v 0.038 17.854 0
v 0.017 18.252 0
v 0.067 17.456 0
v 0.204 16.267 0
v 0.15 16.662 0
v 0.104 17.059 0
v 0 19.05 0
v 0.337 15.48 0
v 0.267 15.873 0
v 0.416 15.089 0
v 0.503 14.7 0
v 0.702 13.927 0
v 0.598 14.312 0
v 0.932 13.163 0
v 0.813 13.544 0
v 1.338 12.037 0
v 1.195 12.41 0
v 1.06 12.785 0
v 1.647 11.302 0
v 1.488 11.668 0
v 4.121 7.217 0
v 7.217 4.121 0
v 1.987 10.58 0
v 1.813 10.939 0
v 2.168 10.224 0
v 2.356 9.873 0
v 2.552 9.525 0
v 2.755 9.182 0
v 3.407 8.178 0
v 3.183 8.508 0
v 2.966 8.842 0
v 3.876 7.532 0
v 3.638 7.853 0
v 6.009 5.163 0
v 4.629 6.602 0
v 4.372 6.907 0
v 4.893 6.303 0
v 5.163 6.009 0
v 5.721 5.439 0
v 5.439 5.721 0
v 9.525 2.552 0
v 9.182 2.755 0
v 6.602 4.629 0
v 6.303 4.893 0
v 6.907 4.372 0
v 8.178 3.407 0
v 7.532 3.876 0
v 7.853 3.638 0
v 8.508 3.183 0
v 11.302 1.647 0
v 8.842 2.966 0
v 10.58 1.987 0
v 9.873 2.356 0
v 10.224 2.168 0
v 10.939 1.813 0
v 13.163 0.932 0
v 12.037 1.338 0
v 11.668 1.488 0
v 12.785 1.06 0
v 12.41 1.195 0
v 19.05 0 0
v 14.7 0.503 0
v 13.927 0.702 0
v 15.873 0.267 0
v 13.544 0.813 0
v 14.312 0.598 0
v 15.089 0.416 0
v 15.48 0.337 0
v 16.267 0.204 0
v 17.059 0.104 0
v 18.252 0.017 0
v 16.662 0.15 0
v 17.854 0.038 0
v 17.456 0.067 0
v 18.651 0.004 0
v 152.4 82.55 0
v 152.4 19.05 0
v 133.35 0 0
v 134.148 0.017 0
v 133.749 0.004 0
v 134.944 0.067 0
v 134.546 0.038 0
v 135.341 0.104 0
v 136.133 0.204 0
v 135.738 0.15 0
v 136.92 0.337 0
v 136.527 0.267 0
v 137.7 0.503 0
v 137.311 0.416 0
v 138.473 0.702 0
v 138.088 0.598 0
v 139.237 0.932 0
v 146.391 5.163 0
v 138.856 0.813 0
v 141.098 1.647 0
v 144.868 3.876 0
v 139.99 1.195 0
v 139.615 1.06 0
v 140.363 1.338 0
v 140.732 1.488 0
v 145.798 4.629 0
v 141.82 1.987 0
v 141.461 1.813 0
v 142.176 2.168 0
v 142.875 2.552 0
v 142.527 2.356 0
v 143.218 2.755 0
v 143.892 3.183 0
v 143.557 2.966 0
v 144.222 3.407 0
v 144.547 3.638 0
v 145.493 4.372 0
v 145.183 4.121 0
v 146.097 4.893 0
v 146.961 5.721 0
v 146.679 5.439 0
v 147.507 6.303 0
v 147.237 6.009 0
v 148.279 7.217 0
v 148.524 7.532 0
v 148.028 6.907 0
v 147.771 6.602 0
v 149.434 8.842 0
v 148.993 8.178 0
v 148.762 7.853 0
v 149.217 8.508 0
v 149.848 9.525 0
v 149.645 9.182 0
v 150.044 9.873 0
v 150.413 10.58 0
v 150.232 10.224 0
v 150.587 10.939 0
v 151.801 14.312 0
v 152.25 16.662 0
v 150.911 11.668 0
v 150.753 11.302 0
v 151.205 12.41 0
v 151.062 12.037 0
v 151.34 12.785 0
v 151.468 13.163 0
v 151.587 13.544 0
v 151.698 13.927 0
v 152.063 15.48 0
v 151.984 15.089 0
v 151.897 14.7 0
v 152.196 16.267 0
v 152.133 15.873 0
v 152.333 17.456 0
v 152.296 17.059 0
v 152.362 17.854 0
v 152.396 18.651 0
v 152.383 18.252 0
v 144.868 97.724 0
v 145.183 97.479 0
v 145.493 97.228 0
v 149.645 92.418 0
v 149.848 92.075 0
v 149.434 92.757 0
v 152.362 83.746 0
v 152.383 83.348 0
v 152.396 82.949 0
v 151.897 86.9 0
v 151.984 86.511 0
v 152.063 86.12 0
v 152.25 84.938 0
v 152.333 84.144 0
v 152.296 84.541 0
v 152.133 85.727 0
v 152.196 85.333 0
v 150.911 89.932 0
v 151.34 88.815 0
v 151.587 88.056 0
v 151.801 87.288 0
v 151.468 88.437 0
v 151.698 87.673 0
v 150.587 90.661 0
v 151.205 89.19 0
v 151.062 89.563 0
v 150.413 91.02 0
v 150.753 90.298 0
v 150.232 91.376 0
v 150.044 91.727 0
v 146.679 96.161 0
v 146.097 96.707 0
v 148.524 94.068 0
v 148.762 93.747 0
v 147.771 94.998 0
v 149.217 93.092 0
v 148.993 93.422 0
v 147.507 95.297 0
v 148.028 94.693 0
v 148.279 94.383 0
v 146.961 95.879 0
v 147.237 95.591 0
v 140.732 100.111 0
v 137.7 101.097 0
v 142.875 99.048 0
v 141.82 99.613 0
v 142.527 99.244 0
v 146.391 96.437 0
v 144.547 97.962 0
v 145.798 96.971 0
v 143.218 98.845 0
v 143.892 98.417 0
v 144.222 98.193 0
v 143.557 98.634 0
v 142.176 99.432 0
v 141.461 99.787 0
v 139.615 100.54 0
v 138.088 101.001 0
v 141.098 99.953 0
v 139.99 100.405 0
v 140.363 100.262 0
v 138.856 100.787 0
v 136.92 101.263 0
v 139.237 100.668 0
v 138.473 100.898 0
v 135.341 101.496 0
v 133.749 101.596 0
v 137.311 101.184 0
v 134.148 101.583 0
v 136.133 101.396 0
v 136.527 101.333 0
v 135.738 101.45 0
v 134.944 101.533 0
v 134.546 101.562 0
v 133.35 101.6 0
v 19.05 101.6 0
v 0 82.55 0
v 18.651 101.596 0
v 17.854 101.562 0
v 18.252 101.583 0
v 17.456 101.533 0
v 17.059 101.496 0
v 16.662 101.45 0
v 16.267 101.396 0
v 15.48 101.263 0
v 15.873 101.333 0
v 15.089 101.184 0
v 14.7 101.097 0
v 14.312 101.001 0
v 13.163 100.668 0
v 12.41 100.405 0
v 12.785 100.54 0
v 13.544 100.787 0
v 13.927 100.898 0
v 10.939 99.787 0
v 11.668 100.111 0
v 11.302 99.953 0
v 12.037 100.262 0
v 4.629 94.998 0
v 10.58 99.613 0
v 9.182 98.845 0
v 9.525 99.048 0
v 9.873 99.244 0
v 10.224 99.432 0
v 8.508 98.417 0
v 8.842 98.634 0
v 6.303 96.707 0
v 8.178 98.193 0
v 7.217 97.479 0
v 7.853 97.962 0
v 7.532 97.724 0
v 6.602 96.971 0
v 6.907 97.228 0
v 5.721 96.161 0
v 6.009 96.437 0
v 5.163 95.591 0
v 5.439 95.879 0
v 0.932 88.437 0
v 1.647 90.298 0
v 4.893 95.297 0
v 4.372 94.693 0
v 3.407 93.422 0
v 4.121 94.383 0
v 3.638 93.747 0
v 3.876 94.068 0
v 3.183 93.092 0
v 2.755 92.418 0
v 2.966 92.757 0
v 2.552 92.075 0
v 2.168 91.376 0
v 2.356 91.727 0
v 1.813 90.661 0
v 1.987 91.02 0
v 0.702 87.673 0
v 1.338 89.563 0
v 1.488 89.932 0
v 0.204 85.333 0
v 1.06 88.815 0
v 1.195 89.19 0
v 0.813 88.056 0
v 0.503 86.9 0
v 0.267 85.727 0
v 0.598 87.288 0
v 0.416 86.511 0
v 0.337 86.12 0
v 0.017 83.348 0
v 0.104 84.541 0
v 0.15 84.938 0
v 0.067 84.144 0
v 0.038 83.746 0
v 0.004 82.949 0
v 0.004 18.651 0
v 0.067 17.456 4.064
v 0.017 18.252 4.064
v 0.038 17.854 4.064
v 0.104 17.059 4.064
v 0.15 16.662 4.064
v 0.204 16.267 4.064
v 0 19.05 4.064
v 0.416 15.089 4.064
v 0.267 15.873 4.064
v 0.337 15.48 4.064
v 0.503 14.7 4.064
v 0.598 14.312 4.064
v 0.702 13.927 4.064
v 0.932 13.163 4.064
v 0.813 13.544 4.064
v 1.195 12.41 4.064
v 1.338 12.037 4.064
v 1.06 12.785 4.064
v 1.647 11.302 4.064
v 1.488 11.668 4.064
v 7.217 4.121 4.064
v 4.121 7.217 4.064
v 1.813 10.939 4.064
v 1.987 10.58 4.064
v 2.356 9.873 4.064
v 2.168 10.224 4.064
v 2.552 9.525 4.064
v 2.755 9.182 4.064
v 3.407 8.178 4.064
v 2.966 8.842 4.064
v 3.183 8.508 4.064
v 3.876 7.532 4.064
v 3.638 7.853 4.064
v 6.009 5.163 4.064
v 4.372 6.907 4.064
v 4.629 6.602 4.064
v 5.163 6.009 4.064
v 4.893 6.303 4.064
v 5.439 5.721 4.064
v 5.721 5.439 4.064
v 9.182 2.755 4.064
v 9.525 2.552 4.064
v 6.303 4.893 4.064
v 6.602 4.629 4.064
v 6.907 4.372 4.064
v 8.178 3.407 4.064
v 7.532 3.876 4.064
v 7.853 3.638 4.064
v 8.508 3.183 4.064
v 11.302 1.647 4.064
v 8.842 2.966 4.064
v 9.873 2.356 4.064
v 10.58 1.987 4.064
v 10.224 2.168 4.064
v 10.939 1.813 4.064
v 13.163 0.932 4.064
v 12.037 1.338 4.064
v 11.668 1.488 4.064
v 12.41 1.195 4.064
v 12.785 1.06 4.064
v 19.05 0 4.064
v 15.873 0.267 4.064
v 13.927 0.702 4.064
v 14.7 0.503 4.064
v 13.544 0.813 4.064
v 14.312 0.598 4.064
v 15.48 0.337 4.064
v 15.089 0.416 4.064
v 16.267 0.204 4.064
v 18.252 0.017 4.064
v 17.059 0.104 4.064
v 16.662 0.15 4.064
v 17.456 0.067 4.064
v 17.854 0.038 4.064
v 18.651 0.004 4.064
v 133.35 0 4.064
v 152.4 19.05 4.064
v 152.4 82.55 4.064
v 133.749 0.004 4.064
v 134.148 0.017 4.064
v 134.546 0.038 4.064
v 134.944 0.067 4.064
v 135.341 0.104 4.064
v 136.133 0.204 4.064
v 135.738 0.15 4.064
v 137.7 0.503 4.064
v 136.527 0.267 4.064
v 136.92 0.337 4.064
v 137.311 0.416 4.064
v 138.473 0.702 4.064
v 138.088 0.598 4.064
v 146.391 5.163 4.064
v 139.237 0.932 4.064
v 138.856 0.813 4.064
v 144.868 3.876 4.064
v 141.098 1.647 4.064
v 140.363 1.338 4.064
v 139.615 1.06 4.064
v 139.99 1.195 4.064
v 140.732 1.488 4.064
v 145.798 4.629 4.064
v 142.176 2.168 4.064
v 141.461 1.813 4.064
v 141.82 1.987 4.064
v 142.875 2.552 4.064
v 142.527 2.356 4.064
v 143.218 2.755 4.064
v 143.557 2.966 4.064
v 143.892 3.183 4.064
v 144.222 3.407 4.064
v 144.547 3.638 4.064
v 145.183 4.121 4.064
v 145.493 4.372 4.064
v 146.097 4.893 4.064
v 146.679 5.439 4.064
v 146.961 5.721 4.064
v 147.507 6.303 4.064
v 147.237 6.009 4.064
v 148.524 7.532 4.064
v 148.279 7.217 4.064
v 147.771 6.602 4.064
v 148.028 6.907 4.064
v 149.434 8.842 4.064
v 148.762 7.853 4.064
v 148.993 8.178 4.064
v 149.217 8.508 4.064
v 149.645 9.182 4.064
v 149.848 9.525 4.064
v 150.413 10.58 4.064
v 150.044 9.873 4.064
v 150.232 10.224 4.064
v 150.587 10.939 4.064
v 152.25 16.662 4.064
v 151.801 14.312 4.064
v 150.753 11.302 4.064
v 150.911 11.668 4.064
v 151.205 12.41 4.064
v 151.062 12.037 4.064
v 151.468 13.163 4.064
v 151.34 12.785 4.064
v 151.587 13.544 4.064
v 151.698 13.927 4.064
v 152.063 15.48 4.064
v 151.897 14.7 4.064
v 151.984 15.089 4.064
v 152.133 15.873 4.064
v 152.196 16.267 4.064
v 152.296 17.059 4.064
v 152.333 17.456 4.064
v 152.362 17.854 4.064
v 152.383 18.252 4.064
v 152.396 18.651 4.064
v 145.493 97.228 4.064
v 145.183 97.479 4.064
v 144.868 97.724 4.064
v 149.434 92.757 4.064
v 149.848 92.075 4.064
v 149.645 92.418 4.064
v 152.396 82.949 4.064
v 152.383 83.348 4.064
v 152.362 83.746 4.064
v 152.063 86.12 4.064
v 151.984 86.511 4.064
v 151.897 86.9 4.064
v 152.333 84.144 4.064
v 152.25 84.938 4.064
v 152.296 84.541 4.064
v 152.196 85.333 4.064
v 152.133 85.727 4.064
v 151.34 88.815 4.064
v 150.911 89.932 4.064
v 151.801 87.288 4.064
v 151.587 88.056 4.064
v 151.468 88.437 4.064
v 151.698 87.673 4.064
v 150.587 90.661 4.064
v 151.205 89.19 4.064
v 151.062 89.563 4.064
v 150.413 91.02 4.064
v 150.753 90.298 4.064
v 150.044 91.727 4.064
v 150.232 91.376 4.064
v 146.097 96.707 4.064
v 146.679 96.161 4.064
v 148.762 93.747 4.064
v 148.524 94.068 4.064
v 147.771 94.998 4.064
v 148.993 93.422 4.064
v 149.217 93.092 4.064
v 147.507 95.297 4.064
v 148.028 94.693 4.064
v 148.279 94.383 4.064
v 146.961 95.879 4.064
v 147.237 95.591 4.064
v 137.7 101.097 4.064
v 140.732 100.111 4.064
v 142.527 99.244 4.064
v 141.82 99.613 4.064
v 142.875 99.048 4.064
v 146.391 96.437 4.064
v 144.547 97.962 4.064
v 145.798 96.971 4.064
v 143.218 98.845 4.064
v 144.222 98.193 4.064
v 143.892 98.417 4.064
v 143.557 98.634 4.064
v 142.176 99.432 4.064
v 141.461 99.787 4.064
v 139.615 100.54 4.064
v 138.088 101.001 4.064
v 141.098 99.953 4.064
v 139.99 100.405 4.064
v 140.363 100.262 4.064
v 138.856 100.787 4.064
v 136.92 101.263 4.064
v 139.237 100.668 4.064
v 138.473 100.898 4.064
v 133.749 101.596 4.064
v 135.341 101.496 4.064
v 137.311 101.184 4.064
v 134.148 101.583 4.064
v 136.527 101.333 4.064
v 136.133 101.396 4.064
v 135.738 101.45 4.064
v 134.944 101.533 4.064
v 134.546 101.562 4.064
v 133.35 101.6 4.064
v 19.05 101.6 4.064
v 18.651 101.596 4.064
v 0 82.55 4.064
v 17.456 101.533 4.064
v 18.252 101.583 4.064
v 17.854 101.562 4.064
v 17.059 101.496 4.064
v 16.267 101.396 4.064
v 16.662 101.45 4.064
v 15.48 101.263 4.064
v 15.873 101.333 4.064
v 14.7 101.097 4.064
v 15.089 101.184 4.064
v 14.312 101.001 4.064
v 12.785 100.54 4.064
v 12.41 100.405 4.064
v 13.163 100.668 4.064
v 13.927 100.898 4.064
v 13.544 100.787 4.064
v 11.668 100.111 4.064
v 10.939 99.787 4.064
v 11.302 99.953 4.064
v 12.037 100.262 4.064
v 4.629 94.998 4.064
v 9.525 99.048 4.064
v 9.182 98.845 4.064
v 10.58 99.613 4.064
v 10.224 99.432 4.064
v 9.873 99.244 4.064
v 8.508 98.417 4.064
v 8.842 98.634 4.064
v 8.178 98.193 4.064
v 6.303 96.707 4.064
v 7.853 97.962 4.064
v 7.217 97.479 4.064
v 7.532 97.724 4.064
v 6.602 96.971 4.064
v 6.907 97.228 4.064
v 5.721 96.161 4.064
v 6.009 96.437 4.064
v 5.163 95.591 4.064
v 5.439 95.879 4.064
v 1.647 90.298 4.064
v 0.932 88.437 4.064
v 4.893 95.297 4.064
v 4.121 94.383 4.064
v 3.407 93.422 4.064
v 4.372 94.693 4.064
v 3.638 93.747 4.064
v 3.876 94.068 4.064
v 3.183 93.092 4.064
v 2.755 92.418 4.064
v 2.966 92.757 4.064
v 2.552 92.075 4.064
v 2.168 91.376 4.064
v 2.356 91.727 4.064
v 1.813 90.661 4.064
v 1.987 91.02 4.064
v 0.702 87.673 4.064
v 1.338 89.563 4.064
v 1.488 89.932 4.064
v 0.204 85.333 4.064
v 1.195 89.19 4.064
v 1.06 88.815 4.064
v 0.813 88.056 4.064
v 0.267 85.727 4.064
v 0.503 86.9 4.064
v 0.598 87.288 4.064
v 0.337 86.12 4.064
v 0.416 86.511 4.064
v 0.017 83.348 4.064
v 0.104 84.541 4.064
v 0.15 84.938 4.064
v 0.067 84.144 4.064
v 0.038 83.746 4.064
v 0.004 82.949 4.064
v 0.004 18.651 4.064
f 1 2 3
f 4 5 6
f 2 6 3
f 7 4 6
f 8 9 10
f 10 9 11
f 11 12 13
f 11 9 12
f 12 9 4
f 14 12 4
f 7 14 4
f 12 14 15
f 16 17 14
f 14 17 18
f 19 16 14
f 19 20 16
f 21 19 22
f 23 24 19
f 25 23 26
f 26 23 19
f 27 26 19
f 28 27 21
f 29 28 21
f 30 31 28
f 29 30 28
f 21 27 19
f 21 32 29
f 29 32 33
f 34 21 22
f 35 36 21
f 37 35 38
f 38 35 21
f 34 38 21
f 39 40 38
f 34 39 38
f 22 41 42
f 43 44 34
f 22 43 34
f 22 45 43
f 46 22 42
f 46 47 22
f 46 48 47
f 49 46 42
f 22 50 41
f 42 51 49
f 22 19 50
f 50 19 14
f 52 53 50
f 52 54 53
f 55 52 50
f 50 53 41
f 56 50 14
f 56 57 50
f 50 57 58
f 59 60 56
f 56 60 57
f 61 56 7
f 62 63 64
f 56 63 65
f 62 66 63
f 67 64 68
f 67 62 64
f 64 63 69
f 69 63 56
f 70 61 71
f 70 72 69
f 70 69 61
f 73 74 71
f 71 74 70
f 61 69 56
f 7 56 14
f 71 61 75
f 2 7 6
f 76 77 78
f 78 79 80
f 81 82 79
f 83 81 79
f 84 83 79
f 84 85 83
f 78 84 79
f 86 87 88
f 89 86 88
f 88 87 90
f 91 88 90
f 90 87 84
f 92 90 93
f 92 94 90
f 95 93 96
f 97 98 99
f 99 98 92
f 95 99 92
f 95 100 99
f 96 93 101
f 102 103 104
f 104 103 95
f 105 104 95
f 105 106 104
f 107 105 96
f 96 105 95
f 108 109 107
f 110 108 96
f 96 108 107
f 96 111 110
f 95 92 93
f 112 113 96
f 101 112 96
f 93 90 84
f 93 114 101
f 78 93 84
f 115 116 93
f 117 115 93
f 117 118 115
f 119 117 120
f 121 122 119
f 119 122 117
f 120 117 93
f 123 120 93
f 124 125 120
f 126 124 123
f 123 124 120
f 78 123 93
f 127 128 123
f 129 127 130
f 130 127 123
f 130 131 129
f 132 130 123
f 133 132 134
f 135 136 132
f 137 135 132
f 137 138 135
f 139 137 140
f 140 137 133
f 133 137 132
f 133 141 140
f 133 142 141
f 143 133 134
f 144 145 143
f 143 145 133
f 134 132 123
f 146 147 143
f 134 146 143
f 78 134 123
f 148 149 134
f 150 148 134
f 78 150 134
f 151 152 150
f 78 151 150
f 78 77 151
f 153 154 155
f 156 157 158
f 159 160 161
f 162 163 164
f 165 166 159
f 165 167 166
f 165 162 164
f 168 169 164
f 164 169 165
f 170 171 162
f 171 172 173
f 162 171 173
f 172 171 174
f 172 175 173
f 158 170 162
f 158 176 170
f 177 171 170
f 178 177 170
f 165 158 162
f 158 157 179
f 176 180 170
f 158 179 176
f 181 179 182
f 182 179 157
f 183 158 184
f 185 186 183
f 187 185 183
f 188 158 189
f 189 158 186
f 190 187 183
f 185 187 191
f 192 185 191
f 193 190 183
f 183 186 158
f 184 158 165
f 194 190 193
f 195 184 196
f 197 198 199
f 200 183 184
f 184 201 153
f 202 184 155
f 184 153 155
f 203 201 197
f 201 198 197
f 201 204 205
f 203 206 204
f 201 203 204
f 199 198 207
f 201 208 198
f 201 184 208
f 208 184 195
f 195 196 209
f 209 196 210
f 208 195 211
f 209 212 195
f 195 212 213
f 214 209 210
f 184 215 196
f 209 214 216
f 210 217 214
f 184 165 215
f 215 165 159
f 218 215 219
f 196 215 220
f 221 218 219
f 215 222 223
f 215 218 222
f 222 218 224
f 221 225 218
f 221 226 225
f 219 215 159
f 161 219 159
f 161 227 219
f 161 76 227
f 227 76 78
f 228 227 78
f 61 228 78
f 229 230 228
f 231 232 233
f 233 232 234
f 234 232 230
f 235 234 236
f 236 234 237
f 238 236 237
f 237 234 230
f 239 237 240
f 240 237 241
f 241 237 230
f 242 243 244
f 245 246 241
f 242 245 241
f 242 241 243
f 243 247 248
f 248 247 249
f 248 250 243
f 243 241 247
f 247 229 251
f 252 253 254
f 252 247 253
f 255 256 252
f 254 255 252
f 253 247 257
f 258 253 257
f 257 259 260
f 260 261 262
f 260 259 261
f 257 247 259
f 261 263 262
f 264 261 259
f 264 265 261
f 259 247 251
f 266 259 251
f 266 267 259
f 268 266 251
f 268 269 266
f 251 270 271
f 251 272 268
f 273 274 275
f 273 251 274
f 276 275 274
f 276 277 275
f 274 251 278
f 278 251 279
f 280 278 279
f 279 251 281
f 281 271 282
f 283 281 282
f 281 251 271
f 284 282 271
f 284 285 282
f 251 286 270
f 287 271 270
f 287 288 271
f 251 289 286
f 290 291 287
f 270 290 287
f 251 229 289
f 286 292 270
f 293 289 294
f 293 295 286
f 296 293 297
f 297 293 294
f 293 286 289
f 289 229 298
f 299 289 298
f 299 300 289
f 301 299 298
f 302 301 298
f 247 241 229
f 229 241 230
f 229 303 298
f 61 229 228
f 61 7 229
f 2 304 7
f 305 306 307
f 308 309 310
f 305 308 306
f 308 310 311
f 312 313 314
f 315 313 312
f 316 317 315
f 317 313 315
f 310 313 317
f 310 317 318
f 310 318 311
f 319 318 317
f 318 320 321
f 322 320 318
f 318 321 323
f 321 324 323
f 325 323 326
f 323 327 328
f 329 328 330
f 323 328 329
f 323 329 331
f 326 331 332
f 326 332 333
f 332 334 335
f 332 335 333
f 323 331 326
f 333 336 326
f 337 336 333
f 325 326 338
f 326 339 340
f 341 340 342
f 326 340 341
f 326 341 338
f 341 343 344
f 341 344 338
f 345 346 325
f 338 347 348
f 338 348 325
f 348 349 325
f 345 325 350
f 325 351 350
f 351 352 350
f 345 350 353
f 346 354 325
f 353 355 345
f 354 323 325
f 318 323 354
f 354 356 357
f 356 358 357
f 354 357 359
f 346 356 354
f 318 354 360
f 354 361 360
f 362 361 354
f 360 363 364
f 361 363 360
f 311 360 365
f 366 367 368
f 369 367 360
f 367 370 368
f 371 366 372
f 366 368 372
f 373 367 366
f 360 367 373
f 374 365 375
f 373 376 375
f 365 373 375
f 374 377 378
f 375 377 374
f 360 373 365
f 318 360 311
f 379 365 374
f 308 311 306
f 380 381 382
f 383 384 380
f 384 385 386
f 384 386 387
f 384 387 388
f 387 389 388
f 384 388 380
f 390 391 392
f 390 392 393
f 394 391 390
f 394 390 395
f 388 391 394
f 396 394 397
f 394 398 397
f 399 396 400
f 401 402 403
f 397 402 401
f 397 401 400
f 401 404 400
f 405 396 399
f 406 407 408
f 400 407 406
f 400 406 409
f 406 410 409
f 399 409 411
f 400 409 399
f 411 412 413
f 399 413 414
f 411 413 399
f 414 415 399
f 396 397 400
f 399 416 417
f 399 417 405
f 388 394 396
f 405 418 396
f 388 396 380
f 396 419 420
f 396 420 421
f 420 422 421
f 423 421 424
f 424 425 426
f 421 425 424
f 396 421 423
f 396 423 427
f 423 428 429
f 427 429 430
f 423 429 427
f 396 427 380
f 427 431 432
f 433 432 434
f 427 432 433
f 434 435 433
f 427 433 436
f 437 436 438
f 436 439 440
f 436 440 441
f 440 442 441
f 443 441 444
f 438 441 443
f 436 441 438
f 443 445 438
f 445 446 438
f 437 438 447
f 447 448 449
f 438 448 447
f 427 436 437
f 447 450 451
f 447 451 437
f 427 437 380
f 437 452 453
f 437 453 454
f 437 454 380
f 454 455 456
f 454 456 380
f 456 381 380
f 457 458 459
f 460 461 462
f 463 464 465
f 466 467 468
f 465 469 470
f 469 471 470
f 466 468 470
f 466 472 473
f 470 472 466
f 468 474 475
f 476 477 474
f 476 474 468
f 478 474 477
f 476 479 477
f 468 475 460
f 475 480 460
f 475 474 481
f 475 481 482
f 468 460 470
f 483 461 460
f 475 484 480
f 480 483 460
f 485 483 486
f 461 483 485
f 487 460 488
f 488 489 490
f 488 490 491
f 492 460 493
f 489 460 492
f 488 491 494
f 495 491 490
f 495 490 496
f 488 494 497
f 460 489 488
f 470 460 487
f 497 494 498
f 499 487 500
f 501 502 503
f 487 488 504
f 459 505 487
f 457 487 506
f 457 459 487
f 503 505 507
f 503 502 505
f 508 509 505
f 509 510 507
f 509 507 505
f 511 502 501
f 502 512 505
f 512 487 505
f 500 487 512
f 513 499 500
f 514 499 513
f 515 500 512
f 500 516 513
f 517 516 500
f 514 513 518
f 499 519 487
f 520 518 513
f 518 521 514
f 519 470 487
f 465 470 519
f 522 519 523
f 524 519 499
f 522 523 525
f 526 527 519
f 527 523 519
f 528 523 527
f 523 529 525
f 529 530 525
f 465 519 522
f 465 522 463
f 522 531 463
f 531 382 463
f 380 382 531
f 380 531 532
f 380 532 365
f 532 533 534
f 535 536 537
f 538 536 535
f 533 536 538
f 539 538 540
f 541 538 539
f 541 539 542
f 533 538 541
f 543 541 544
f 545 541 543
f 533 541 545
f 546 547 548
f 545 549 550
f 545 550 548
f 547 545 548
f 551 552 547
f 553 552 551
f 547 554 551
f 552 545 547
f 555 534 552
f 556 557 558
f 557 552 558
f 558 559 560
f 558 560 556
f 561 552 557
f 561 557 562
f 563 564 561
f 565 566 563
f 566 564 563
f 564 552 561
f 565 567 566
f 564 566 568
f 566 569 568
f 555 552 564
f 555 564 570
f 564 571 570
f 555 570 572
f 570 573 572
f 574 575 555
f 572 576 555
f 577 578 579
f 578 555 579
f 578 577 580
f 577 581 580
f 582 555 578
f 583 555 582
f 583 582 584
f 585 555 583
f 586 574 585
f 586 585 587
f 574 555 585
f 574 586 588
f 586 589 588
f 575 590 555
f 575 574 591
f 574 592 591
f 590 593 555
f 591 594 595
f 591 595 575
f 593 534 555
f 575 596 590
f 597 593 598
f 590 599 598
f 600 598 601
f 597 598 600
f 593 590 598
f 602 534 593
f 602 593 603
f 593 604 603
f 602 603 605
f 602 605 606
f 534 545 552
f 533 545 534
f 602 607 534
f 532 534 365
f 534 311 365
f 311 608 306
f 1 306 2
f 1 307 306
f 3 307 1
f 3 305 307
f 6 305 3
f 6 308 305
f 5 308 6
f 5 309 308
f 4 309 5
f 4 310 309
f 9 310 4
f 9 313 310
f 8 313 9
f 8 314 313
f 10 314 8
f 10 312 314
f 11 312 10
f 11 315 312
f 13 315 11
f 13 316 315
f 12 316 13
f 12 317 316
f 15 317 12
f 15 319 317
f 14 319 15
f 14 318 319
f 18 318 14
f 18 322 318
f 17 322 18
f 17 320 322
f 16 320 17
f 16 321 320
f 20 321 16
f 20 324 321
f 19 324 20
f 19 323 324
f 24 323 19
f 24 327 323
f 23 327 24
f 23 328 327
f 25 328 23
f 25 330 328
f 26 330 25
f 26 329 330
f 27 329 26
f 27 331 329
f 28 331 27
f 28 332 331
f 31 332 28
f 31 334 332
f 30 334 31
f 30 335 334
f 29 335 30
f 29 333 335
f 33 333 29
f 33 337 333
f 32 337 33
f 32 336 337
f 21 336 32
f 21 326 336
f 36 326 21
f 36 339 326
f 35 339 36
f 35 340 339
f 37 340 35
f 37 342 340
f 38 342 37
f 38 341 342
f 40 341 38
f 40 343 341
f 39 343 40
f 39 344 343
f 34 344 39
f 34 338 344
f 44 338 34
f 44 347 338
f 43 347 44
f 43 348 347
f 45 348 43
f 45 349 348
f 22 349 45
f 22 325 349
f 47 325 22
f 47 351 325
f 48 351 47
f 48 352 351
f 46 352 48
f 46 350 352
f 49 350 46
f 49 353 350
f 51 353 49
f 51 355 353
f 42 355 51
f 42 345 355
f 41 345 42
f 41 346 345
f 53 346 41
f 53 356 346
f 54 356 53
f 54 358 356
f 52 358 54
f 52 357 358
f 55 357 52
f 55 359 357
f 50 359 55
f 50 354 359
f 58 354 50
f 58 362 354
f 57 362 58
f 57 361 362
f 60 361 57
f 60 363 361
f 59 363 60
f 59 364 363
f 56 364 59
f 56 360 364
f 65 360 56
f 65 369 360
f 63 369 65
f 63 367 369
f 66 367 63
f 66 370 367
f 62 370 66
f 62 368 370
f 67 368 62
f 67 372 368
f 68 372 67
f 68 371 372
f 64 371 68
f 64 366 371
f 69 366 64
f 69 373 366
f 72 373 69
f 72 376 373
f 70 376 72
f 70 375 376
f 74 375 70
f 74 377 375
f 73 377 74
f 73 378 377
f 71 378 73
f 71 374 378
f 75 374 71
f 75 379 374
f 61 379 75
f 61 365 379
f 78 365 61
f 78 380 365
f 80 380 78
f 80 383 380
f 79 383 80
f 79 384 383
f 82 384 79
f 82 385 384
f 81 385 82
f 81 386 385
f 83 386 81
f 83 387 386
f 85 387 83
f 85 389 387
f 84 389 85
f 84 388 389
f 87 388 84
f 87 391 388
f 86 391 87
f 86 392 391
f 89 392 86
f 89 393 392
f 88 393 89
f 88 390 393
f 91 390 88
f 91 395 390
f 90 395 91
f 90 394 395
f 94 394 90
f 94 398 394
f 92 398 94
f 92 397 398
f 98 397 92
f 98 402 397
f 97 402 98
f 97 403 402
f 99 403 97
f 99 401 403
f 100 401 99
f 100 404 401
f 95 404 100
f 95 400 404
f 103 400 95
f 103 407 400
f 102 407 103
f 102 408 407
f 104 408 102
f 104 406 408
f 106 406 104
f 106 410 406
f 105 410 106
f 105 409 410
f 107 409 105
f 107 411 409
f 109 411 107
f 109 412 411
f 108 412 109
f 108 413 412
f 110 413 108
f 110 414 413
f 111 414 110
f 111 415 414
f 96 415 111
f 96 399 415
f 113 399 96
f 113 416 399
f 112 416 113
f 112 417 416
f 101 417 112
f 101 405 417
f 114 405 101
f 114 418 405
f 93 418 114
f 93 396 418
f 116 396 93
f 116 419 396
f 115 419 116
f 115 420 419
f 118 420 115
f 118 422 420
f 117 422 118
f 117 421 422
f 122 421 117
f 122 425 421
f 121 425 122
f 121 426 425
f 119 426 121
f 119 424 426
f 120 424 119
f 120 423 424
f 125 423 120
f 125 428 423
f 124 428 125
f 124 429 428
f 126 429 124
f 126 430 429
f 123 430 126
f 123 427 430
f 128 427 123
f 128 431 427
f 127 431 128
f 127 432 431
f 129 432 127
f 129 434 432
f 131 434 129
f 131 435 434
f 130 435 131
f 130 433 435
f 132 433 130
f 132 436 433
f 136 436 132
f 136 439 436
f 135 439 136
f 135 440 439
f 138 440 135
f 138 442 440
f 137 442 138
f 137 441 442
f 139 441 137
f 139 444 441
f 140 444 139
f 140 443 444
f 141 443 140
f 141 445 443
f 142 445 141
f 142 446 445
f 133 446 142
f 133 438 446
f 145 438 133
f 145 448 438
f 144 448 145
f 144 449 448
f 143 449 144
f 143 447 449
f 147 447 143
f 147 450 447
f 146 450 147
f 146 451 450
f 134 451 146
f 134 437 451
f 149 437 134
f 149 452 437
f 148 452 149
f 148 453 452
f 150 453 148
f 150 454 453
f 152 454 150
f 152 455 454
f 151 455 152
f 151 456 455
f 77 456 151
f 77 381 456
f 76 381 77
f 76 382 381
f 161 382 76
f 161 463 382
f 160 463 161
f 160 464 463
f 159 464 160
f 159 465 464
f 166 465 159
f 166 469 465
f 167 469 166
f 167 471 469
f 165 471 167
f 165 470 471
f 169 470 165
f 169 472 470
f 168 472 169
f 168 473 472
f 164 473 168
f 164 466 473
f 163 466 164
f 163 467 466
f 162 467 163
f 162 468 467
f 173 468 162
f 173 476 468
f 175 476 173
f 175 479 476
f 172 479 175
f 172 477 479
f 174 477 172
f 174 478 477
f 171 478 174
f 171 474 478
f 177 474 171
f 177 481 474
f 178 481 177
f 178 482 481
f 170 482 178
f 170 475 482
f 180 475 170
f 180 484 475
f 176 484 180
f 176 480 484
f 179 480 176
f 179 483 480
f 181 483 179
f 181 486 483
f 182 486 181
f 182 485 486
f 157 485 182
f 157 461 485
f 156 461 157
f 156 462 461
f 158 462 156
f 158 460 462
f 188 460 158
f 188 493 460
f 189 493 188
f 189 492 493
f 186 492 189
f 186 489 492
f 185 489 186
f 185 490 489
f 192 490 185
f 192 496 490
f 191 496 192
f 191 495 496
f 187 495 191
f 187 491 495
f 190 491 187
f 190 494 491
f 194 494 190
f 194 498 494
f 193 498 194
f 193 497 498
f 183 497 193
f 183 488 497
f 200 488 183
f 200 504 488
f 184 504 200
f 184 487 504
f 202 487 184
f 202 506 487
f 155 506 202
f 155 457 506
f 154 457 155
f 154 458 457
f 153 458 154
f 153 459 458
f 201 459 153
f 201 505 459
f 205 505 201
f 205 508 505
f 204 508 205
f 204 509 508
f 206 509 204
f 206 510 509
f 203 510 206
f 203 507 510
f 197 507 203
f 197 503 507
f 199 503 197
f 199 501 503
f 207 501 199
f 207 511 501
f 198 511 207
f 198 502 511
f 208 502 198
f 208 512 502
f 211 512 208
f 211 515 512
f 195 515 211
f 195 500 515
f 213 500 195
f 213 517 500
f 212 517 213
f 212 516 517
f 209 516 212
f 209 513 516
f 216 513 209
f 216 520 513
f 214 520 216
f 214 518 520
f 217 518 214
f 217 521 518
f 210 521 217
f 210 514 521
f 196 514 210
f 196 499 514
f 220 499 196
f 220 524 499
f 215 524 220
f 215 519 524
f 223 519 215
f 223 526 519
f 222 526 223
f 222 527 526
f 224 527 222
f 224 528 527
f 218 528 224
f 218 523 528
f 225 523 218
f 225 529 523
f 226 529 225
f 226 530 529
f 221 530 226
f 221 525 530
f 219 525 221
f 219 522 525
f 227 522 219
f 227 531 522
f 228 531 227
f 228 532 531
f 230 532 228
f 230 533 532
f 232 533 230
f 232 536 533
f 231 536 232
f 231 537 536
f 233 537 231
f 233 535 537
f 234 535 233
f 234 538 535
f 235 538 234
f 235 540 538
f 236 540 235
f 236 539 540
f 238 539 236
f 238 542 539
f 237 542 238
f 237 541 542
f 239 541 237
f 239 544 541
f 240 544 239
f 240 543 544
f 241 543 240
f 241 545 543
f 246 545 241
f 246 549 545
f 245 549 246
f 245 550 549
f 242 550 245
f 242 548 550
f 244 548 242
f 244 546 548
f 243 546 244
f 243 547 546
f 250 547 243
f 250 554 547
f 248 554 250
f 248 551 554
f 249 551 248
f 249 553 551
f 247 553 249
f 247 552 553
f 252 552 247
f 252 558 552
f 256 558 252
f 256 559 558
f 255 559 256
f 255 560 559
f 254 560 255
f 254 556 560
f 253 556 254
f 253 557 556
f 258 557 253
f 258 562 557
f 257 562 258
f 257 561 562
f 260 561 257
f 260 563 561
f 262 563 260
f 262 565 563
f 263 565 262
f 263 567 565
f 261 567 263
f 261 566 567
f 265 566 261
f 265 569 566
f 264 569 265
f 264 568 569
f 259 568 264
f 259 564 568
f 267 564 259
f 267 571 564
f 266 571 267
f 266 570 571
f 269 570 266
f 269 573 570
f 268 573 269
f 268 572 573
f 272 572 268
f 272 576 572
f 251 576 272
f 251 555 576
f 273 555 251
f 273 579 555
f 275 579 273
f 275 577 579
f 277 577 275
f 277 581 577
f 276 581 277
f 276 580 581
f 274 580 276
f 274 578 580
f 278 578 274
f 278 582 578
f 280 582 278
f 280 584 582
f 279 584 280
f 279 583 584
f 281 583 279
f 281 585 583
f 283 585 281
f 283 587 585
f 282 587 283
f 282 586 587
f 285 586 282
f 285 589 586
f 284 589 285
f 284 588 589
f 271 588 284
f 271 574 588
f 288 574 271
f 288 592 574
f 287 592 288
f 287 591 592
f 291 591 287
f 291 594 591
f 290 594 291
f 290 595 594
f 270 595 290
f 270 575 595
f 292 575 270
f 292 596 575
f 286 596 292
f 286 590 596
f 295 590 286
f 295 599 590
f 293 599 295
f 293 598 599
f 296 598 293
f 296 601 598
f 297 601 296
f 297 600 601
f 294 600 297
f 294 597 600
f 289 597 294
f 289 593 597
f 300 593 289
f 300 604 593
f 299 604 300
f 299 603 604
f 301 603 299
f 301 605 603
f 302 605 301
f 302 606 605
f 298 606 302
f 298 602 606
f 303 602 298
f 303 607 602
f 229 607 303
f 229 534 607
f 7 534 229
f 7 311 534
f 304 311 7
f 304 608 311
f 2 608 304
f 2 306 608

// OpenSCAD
// file: commands.scad
// Helper function. Finds the point that the two edges intersect, and turns the
// other two points into vectors based off of the corner position
function sort_edge_points(edge1, edge2) =
    edge1[0] == edge2[0] ?
        [edge1[0],edge1[1] - edge1[0],edge2[1] - edge1[0]]
    : edge1[0] == edge2[1] ?
        [edge1[0],edge1[1] - edge1[0],edge2[0] - edge1[0]]
    : edge1[1] == edge2[0] ?
        [edge1[1],edge1[0] - edge1[1],edge2[1] - edge1[1]]
    : 
        [edge1[1],edge1[0] - edge1[1],edge2[0] - edge1[1]];

// Finds the magnitude of a component vector
function v_mag(v) = sqrt((v[0]^2)+(v[1]^2));
// Finds the direction (angle) of a component vector
function v_dir(v) = atan2(v[1],v[0]);
// Finds x vector component from magnitude and direction
function vx(m, d) = m*cos(d);
// Finds y vector component from magnitude and direction
function vy(m, d) = m*sin(d);
// Finds the dot product of two vectors
function dot_p(a, b) = a[0]*b[0]+a[1]*b[1];
// Finds the angle between two intersecting vectors
function find_angle(a, b) = acos(dot_p(a,b)/(v_mag(a)*v_mag(b)));
// Finds the closest rotation to get from a1 to a2. -180 to 180
function angle_distance(a1, a2) = (((a2-a1+180)%360-360)%360+180);

// Extrude blind stretches a 2D sketch by a certain amount to create a 3D shape
// int direction: Determines which way the extrude goes
// float amount: Determines how far to extrude
module extrude_blind(direction, amount) {
    // Any positive number extrudes in the positive direction
    if (direction > 0) {
        linear_extrude(amount)
        children();
    // Any positive number extrudes in the negative direction
    } else if (direction < 0) {
        translate([0, 0, -amount])
        linear_extrude(amount)
        children();
    // 0 extrudes in both directions
    } else {
        translate([0, 0, -amount])
        linear_extrude(amount*2)
        children();
    }
}

// Coincident origin moves the origin of a part to a specific coordinate
// float[3] translation: The coordinate position to move the part's origin to
// float[3] offset: The coordinate offset from the translation. Defaults to no offset
module coincident_origin(translation, o=[0,0,0]) {
    // Applies the translation and offset to all children
    translate(translation+o)
    children();
}

// Sketch plane defines the plane of rotation and translation that a sketch is on
// float plane[2][3]: An array that holds a rotation and translation array
module sketch_plane(plane) {
    rotation = plane[0];
    translation = plane[1];
    // Applies the translation and rotation to all children
    rotate(rotation)
    translate(translation)
    children();
}

// Outer Fillet 2D applies a fillet to an outer corner of two 2D intersecting lines
// float radius: The radius of the circle used to fillet the corner
// float[2][2] edge1: Array of two 2D points ([x,y]). Order of points or edges doesn't matter
// float[2][2] edge2: Array of two 2D points ([x,y]). Order of points or edges doesn't matter
// Both edges must be a line that terminates at the mutual intersection
module outer_fillet_2D(radius, edge1, edge2) {
    // Sorts the edges to find the vertex and the position vectors
    sorted = sort_edge_points(edge1, edge2);
    corner = sorted[0];
    v1 = sorted[1];
    v2 = sorted[2];
    // Finds the angle direction of both position vectors
    v1d = v_dir(v1);
    v2d = v_dir(v2);
    // Finds the angle between the two vectors
    direction = find_angle(v1, v2) / 2;
    // Finds which angle is the initial side of the angle (the other would be the terminal)
    initial = angle_distance(v1d, v2d) > 0 ? v1d : v2d;
    // Offsets the initial direction to the middle of both vectors
    o_dir = initial + direction;
    // Finds the distance from the vertex to the center of a circle tangent to both lines
    s = radius / (sin(direction));
    // Finds the coordinate position of s
    center = [corner[0]+vx(s, o_dir), corner[1]+vy(s, o_dir)];
    // Finds the distance from the vertex to either tangent point on the circle
    tan_l = sqrt((s^2)-(radius^2));
    // Finds the coordinate position of both tangent points
    tan1 = [corner[0]+vx(tan_l, v1d), corner[1]+vy(tan_l, v1d)];
    tan2 = [corner[0]+vx(tan_l, v2d), corner[1]+vy(tan_l, v2d)];
    
    // Cuts out the final polygon from all the children, leaving behind a perfect filleted corner
    difference() {
        children();
        // Cuts the circle out of the polygon, leaving behind everything the fillet removes
        difference() {
            // creates a polygon that follows the form of the edges and center point
            polygon(points = [corner, tan1, center, tan2]);
            // Moves the circle to be tangent to both edges
            translate(center) {
                // Creates a circle with the radius of the fillet
                circle(radius);
            }
        }
    }
}
// file: chassis.scad
// Make sure to add these two imports to every part file you make
include <global_variables.scad>
use <commands.scad>

// Each sketch in a part will have it's own module
module bottom_plate_sketch() {
    // Just some variable that hold the 4 corner points of the plate
    BL = [0,0];
    TL = [0,body_length];
    TR = [body_width,body_length];
    BR = [body_width,0];

    // Creates a fillet on all 4 corners with radius of wall_outer_corner_fillet
    outer_fillet_2D(wall_outer_corner_fillet, [BR,BL], [BL,TL])
    outer_fillet_2D(wall_outer_corner_fillet, [BL,TL], [TL,TR])
    outer_fillet_2D(wall_outer_corner_fillet, [TL,TR], [TR,BR])
    outer_fillet_2D(wall_outer_corner_fillet, [TR,BR], [BR,BL])
    // The initial shape of the sketch goes at the very bottom.
    // Transformations are applied from the bottom up
    polygon(points = [BL,TL,TR,BR]);
}

// This is your main part constructor. You will call this from the assembly
module chassis() {
    // All your mates go at the top
    coincident_origin(global_origin)
    
    // Everything within a union will become 1 single 3D model.
    // If you want to break a part into multiple models, you can
    // create multiple different unions
    union() {
        // Each sketch needs a sketch plane. This is the surface that the sketch is on.
        sketch_plane(flat_plane)
        // This is a command. You can apply many different commands to a sketch.
        // Extrude blind takes a direction (based on sign) and an amount
        extrude_blind(1, plate_thickness) {
            bottom_plate_sketch();
        }
    }
}
// file: global_variables.scad
// Units are in millimeters

default_clearance = 0.508;

body_length = 101.6;
body_width = 152.4;
plate_thickness = 4.064;
wall_outer_thickness = 5.08;
wall_height = 27.94;
wall_outer_corner_fillet = 19.05;
wall_mount_thickness = 2.54;

wheel_clearance = 1.27;
wheel_wall_distance = 3.81;
wheel_guard_thickness = 2.54;

n20_platform_height = 6.604;

switch_height = 20.32;

ramp_splay_width = 165.1;
ramp_opening_width = 50.8;
ramp_length = 57.15;
ramp_inner_thickness = 27.94;
ramp_slope_height_percent = 100; // percentage
ramp_barb_height = 5.08;
ramp_barb_slope_distance = 10.16;
ramp_barb_gap_distance = 10.16;

weapon_inner_diameter = 33.528;
weapon_bite_diameter = 38.1;
weapon_length = 88.9;
weapon_gap = 3.81;

flat_plane = [[0,0,0], [0,0,0]];
tilt_plane = [[0,45,0], [0,0,0]];
global_origin = [0,0,0];
// main file
// NOTICE! You must us preview on this script if you want to see your models

// Make sure that all parts you want included in the assembly are imported
include <global_variables.scad>
use <chassis.scad>

// These two variables increase the resolution. Keep them commented when editing the
// the model to reduce strain on your computer
$fa = 1;
$fs = 0.4;

// This is where you call all the parts you want loaded.
// If you give your parts parameters, you can call multiple of the same part with different outcomes.
// You can also directly apply transformations like translate and rotate here. I don't suggest it though
module load_objects() {
    chassis();
}

// Begins the loading of objects
load_objects();
